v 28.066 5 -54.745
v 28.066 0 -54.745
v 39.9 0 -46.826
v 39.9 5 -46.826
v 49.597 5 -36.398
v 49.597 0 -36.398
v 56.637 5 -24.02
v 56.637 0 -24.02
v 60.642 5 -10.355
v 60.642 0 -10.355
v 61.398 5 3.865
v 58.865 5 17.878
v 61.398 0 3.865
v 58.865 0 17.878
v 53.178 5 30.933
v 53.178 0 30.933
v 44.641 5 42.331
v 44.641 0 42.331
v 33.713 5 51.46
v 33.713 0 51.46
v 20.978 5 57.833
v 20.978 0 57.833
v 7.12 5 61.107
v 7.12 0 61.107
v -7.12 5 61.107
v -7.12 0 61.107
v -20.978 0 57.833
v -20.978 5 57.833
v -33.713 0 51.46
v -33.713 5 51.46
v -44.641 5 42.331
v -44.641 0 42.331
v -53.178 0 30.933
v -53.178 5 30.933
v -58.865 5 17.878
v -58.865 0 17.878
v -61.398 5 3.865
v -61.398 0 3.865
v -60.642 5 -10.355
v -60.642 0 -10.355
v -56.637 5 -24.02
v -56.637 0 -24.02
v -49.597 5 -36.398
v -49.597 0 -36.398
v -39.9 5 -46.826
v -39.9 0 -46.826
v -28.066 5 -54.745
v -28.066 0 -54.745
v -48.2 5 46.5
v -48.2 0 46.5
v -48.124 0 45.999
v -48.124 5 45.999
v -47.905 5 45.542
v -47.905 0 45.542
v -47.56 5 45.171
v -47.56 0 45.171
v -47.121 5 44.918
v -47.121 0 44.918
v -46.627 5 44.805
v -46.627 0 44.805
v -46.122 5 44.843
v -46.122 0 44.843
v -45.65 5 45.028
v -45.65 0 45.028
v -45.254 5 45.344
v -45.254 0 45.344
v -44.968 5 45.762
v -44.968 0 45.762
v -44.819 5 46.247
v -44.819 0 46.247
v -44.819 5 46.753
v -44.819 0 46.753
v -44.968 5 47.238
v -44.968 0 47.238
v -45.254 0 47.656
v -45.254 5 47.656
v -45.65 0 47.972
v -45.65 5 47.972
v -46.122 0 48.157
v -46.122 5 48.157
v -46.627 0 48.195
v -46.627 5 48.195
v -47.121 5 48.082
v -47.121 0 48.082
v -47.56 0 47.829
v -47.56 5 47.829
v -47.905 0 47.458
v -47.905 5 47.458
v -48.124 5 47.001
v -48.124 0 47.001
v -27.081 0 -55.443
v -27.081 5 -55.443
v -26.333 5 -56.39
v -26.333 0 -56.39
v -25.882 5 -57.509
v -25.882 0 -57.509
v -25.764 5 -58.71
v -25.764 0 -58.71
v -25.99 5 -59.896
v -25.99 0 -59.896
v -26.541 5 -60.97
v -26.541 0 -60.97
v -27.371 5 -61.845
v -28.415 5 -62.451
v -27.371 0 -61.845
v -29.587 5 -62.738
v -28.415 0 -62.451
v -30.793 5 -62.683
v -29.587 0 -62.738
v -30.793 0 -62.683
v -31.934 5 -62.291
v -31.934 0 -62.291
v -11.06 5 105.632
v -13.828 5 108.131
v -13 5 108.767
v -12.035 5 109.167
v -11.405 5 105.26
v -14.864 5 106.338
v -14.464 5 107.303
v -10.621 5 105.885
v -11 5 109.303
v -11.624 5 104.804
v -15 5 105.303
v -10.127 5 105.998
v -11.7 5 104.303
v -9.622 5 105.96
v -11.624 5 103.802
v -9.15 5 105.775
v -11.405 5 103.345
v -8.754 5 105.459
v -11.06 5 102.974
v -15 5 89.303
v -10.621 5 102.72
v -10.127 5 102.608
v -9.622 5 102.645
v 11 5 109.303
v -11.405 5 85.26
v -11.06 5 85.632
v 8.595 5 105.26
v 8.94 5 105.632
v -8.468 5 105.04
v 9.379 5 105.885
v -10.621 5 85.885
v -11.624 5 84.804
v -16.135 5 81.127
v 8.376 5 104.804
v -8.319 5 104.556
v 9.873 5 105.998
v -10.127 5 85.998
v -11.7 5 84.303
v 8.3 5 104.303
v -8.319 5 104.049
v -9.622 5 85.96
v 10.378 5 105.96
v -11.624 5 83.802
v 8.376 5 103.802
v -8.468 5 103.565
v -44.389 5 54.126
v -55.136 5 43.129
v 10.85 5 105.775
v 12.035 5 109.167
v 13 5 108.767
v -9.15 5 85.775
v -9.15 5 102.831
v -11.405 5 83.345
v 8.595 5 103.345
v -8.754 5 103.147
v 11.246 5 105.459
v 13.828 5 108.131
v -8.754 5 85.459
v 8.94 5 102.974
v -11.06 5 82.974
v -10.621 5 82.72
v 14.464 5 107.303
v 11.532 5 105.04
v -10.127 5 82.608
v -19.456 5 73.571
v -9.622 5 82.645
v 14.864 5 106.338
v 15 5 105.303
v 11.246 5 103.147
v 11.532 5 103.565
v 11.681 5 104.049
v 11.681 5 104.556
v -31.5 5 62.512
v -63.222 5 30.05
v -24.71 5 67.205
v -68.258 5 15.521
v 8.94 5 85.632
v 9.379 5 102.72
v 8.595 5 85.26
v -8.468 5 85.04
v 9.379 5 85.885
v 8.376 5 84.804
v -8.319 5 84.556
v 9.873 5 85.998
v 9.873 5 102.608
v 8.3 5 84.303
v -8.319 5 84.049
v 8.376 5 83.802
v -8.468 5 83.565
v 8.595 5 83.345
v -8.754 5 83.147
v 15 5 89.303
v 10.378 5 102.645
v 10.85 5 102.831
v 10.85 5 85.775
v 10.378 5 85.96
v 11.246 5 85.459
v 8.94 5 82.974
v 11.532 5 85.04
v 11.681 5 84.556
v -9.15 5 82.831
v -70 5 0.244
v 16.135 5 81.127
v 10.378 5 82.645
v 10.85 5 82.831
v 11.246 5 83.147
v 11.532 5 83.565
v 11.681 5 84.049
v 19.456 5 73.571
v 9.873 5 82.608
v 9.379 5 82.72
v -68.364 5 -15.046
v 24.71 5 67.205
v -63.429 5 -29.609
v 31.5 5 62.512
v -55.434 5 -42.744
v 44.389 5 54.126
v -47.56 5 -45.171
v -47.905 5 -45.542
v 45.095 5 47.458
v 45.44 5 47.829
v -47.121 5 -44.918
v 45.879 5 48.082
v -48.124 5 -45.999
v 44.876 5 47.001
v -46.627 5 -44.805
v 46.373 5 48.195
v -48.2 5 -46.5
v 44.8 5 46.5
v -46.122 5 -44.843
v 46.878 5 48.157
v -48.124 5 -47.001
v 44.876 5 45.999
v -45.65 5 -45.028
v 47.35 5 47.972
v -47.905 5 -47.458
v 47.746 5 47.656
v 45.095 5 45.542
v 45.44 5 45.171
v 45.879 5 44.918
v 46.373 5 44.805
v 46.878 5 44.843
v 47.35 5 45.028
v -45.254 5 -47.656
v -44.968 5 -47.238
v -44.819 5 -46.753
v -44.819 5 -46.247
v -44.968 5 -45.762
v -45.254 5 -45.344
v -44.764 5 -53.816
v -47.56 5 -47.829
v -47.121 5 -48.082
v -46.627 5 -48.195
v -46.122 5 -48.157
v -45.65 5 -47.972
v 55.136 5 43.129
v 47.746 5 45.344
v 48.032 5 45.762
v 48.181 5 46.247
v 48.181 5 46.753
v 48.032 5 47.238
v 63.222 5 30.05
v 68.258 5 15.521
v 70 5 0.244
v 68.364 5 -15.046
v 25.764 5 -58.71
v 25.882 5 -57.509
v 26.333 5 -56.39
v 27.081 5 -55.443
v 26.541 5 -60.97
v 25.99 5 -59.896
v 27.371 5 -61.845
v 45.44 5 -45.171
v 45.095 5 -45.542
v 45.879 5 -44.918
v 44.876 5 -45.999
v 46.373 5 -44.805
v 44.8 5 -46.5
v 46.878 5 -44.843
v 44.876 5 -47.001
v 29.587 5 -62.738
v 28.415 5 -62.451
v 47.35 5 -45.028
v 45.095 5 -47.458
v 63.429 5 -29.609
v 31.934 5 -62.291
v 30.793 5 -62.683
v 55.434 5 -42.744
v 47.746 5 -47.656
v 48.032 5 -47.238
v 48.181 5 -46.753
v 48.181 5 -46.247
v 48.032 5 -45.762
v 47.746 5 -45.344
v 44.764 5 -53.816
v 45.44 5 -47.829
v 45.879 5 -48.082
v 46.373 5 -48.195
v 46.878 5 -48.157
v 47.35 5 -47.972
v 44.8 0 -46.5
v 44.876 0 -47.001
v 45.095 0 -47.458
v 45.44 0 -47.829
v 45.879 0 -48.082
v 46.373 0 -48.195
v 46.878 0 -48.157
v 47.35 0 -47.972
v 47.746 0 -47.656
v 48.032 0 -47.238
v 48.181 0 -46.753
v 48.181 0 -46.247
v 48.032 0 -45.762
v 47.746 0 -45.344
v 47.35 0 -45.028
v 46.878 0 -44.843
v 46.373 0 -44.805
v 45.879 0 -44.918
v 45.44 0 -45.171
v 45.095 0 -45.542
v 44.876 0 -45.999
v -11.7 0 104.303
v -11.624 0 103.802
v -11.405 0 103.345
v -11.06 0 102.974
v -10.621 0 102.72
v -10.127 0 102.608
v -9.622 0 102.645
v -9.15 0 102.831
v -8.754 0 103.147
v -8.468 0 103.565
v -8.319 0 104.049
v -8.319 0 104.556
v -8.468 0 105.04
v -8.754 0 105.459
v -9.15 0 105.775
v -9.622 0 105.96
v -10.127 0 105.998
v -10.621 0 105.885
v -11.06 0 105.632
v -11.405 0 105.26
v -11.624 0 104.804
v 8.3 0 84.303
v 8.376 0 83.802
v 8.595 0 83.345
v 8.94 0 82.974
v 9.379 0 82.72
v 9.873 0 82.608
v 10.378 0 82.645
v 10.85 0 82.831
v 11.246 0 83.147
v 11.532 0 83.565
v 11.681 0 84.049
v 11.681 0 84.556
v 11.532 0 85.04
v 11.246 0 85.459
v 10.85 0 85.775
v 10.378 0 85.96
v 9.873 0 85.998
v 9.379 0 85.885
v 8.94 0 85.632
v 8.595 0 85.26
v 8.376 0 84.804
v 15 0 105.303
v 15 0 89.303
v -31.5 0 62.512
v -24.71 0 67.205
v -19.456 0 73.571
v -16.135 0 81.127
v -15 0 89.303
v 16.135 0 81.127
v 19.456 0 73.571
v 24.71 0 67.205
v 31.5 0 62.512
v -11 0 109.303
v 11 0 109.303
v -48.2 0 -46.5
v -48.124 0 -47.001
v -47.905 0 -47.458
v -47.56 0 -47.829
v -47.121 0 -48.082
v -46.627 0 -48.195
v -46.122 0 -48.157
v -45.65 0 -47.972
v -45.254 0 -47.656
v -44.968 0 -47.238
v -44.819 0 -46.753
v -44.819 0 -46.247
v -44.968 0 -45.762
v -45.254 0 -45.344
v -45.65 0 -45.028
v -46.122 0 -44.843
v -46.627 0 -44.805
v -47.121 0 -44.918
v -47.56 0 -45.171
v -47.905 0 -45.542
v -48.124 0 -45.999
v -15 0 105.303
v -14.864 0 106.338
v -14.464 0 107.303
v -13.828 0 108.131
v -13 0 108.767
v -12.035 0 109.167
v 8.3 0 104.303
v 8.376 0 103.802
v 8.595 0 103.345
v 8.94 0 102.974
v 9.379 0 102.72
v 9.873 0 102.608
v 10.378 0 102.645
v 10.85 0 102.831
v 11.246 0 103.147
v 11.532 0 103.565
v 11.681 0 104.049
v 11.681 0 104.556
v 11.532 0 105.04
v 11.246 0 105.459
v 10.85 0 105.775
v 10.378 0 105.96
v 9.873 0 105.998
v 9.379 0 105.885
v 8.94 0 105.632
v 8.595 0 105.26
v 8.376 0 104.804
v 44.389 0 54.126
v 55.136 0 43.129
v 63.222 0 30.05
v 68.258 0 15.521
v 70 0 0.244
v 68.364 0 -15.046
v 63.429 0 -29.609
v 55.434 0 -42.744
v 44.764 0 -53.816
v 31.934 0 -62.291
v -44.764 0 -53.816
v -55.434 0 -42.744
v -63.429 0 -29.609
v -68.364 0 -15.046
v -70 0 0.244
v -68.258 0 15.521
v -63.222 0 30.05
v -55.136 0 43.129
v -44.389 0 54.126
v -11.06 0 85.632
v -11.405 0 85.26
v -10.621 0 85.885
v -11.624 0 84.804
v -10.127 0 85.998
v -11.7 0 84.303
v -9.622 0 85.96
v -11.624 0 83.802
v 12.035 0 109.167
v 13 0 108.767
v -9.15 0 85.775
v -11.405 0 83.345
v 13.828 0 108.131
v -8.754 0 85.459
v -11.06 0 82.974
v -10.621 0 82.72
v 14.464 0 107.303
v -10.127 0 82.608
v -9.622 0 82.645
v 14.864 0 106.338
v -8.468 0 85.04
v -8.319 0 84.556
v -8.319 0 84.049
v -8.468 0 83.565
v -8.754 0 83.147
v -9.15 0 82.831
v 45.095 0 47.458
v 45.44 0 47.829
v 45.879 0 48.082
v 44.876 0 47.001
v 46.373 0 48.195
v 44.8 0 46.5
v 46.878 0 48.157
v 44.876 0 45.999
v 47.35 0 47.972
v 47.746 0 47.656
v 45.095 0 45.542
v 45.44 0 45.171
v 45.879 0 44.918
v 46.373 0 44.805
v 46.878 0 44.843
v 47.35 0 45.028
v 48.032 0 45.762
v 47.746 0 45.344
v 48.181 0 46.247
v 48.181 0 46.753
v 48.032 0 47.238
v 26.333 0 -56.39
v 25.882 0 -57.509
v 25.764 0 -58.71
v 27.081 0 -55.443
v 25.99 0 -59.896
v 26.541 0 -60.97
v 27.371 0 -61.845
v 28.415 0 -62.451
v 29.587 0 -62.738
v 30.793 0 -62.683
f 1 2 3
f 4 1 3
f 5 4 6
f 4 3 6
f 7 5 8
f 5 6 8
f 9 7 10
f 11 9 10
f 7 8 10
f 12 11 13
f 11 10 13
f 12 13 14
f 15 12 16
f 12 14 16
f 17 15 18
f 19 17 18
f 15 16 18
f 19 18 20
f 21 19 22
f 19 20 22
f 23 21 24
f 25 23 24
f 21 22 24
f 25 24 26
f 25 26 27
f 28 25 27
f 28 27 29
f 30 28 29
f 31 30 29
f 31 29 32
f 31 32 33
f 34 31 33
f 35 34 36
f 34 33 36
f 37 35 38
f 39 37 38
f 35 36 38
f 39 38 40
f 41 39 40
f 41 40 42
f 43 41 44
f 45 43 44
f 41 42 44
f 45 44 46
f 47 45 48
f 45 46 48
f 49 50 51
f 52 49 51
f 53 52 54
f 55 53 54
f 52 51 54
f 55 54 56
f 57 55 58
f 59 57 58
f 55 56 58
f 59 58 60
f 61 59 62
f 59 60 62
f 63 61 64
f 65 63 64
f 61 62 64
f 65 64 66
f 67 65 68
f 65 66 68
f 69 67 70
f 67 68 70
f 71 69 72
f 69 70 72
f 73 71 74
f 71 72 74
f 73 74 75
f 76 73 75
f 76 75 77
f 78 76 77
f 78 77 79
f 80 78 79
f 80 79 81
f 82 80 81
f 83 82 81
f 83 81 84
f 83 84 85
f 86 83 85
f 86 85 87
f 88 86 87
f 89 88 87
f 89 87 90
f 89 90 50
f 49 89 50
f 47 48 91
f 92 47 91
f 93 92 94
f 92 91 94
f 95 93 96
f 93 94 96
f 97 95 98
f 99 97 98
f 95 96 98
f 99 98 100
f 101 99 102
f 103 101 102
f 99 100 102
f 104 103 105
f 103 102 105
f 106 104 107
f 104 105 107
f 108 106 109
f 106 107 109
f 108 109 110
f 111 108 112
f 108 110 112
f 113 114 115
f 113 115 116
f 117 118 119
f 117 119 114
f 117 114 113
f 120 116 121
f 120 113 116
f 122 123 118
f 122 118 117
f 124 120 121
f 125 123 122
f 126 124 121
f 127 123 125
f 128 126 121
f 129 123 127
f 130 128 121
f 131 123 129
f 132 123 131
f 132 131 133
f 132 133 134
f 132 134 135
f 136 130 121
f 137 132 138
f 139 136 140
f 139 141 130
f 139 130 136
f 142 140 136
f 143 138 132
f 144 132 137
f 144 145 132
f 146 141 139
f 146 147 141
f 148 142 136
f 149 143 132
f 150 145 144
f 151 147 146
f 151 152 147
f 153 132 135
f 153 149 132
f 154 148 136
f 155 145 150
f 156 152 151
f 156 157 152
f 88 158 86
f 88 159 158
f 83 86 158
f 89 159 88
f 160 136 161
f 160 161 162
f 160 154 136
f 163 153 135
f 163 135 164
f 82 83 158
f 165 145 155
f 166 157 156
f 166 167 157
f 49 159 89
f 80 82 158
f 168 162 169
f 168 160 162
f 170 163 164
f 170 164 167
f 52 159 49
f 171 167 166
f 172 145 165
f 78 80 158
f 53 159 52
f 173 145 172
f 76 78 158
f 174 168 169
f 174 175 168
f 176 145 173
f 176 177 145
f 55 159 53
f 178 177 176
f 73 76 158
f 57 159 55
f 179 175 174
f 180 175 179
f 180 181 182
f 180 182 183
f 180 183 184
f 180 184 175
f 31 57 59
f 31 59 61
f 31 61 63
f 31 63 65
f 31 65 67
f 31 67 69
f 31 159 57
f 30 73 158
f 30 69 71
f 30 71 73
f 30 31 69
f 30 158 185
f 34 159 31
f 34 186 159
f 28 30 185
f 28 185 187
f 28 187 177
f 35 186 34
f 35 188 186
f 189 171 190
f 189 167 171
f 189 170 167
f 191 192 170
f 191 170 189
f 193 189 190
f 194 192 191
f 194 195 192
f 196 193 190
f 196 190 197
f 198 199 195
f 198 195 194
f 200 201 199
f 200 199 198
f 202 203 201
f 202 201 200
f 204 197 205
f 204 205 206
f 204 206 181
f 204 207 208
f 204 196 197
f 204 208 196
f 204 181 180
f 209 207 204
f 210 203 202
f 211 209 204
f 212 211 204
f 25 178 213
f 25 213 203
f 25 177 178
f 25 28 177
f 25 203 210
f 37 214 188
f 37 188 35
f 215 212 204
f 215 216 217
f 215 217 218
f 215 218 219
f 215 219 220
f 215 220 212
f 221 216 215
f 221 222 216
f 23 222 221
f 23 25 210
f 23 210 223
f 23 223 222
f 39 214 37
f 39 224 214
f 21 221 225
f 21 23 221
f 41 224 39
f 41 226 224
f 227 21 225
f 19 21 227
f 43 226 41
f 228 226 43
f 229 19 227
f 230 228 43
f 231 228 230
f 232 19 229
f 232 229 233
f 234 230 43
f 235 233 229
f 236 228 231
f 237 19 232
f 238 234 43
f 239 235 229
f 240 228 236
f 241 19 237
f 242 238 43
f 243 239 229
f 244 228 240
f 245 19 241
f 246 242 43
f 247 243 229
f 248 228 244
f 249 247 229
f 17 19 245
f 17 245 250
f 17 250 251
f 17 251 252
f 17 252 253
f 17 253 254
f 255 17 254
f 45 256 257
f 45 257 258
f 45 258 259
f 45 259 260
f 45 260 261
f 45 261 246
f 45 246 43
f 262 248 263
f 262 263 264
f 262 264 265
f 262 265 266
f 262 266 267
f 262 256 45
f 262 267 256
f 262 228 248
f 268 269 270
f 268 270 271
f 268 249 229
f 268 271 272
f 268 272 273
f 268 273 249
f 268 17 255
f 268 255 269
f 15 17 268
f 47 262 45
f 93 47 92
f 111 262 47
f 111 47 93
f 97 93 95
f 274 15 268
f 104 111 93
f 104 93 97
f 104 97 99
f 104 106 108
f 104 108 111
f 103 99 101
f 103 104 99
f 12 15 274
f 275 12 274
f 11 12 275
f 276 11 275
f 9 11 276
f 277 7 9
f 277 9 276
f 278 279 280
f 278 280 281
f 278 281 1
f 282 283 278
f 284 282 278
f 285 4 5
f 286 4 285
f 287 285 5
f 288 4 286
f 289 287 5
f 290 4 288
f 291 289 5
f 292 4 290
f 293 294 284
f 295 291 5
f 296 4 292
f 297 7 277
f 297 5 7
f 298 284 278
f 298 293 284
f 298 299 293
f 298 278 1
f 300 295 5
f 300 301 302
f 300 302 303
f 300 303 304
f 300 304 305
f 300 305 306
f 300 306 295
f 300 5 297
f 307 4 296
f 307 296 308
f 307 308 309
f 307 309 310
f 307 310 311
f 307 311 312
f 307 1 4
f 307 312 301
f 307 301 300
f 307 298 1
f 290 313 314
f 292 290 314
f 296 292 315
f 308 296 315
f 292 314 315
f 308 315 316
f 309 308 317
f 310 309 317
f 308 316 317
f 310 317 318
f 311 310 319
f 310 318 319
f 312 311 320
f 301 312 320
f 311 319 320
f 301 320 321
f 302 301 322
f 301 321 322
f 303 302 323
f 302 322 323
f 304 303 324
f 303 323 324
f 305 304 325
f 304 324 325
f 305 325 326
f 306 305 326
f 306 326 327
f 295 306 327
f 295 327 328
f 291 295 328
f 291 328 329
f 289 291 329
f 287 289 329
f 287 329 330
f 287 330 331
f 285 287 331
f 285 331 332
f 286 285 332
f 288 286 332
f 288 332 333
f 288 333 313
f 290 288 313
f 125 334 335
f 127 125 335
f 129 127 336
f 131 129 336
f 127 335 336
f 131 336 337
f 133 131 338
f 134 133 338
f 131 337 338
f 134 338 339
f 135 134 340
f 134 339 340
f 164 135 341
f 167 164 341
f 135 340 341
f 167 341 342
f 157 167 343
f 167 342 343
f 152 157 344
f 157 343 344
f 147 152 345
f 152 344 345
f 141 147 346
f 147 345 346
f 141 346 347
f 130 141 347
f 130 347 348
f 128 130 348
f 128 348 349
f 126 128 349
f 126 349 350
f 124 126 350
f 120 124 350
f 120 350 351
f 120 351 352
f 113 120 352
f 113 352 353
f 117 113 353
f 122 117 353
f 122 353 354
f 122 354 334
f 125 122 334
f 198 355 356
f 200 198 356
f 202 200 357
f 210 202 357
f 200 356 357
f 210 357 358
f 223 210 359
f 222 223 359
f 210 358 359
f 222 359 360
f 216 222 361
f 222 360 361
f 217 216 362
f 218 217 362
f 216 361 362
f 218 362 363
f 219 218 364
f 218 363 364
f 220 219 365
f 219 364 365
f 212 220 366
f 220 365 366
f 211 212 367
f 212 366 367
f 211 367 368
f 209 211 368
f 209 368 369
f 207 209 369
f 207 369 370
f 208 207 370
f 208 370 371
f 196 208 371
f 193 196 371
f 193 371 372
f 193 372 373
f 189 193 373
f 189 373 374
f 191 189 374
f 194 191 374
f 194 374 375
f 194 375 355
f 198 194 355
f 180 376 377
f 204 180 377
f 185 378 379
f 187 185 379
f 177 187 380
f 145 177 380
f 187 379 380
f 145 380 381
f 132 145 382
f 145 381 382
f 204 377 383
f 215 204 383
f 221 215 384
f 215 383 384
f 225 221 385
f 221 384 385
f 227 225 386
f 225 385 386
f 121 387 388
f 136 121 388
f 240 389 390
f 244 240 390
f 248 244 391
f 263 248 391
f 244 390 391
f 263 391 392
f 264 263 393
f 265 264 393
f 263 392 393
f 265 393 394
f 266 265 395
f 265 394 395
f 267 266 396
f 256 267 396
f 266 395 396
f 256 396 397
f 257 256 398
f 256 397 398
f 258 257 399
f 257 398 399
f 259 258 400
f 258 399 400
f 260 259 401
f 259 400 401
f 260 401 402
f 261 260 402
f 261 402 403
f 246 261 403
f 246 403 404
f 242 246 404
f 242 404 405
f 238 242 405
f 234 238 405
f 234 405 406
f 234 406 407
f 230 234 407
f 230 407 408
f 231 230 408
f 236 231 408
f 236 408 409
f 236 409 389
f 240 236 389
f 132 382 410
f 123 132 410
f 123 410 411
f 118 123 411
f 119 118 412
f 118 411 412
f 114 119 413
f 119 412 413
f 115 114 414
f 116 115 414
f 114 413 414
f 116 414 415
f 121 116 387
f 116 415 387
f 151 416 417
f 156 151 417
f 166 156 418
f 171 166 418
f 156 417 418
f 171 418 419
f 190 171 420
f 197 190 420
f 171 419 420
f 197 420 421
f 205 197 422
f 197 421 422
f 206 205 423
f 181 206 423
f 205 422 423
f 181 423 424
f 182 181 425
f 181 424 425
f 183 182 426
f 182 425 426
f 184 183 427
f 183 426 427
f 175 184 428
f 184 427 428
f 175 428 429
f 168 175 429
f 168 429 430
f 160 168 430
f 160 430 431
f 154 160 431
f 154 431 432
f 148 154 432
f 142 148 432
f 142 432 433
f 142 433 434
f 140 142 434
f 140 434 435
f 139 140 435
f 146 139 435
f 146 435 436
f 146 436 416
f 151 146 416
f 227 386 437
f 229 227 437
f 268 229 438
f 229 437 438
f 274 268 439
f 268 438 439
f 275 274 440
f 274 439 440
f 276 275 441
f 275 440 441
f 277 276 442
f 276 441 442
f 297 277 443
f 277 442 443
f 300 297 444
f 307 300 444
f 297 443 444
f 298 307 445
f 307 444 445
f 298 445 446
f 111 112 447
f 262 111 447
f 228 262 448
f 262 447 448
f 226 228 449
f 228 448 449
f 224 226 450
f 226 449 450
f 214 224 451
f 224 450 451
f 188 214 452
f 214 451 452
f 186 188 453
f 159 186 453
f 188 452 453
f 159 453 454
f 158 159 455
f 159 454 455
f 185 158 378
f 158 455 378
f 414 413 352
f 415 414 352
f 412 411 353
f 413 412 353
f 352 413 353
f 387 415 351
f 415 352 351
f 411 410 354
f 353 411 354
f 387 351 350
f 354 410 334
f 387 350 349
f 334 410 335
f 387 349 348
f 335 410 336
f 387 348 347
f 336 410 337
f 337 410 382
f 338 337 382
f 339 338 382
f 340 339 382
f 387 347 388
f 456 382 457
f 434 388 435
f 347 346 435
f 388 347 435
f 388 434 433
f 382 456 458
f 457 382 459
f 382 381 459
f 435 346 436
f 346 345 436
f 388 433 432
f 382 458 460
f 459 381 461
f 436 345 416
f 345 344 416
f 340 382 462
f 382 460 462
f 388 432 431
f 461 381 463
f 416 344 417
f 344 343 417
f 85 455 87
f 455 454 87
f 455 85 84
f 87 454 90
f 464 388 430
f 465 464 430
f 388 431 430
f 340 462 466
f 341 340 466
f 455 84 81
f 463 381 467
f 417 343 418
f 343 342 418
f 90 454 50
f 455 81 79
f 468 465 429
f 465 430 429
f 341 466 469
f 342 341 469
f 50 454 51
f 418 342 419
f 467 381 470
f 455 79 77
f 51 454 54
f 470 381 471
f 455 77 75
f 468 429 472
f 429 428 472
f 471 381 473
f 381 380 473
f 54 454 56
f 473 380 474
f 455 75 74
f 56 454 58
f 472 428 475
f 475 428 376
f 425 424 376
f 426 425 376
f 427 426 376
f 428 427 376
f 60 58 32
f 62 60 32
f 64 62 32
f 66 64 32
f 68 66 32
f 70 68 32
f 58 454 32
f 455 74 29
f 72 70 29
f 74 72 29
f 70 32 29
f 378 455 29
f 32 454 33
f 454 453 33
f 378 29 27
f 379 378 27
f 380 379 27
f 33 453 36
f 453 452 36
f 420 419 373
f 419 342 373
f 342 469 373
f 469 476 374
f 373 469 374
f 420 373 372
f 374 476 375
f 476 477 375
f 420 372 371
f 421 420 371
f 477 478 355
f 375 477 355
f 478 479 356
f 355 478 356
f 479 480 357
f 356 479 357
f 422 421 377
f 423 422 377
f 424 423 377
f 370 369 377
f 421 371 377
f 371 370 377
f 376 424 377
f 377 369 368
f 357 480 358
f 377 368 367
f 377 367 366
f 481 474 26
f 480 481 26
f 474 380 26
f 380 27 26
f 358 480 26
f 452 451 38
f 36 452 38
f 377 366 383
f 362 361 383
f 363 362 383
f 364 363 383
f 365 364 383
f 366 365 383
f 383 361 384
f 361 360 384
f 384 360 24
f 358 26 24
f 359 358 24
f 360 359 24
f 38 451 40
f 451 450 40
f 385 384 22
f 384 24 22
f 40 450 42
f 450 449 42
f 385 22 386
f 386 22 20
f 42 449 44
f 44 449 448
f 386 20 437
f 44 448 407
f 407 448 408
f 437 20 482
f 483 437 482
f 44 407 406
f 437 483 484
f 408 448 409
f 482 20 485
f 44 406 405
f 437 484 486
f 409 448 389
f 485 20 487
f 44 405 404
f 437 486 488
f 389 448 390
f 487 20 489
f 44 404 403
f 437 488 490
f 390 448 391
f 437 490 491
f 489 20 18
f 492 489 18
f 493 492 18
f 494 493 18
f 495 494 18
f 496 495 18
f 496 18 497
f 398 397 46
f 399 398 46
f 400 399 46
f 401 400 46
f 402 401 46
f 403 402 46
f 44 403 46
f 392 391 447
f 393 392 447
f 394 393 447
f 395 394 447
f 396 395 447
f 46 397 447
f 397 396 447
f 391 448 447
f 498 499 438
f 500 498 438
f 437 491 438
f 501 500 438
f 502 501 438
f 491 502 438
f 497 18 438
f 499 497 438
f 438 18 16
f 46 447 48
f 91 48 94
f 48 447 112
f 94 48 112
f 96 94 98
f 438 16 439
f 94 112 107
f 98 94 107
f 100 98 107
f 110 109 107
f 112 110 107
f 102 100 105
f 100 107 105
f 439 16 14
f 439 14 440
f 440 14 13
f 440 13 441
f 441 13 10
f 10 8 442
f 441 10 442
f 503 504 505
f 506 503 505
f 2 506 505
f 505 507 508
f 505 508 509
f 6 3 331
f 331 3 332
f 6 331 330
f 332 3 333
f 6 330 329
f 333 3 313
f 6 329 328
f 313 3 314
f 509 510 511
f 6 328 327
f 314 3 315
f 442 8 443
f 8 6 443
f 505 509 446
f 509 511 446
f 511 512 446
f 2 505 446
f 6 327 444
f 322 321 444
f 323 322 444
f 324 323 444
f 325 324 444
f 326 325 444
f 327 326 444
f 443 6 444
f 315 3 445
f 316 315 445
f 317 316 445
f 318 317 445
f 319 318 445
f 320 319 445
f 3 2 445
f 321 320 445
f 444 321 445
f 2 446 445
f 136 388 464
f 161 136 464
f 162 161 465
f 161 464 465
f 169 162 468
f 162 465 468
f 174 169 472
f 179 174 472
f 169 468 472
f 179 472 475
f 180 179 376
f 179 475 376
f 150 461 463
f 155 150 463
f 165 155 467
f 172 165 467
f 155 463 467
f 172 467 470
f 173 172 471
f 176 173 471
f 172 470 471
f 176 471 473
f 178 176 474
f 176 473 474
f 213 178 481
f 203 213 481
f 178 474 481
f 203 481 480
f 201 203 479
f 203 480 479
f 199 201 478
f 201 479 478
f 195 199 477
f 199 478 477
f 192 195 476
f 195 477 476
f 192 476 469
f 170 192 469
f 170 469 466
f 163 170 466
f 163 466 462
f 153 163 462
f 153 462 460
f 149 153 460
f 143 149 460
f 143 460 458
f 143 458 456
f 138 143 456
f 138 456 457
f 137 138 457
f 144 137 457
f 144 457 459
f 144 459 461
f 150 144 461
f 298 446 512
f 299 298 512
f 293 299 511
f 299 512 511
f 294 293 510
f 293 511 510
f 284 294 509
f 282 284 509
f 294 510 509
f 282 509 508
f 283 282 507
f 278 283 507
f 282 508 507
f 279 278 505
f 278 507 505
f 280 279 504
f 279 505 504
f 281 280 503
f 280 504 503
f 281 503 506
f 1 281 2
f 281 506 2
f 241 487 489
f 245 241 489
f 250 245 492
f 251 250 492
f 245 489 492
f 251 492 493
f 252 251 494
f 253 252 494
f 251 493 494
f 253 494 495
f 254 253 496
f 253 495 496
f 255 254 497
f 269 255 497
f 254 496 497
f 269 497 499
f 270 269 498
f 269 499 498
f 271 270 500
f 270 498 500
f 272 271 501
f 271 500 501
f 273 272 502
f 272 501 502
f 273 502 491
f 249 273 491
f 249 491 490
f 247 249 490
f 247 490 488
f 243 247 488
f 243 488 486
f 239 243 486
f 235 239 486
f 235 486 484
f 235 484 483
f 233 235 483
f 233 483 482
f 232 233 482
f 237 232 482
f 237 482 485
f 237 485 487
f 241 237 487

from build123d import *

# Parameters (mm, degrees)
BOSS_EXTRU_1_DEPTH = 5
D_GAGEMENT_M31_D   = 3.4


with BuildPart() as part:
    # Esquisse1 → Boss.-Extru.1 (new body)
    with BuildSketch(Plane(origin=(0, 0, 0), x_dir=(1, 0, 0), z_dir=(0, 1, 0))):
        with BuildLine():
            Line((-15, -89.302855497), (-15, -105.302855497))
            ThreePointArc((-15, -105.302855497), (-13.828427125, -108.131282622), (-11, -109.302855497))
            Line((-11, -109.302855497), (11, -109.302855497))
            ThreePointArc((11, -109.302855497), (13.828427125, -108.131282622), (15, -105.302855497))
            Line((15, -105.302855497), (15, -89.302855497))
            ThreePointArc((15, -89.302855497), (19.455920451, -73.570722775), (31.5, -62.511998848))
            ThreePointArc((31.5, -62.511998848), (69.999576157, -0.243593621), (31.934306569, 62.291251905))
            ThreePointArc((31.934306569, 62.291251905), (26.226929885, 60.452488359), (28.065693431, 54.745111675))
            ThreePointArc((28.065693431, 54.745111675), (0, -61.52), (-28.065693431, 54.745111675))
            ThreePointArc((-28.065693431, 54.745111675), (-26.226929885, 60.452488359), (-31.934306569, 62.291251905))
            ThreePointArc((-31.934306569, 62.291251905), (-69.999576157, -0.243593621), (-31.5, -62.511998848))
            ThreePointArc((-31.5, -62.511998848), (-19.455920451, -73.570722775), (-15, -89.302855497))
        make_face()
    extrude(amount=BOSS_EXTRU_1_DEPTH)

    # Dégagement M31 (through all)
    with Locations(Plane(origin=(0, 5, 0), x_dir=(1, 0, 0), z_dir=(0, 1, 0))):
        with Locations((46.5, 46.5), (46.5, -46.5), (-46.5, -46.5), (-46.5, 46.5), (-10, -84.302855497), (10, -84.302855497), (10, -104.302855497), (-10, -104.302855497)):
            Hole(D_GAGEMENT_M31_D / 2)


solid = part.part
